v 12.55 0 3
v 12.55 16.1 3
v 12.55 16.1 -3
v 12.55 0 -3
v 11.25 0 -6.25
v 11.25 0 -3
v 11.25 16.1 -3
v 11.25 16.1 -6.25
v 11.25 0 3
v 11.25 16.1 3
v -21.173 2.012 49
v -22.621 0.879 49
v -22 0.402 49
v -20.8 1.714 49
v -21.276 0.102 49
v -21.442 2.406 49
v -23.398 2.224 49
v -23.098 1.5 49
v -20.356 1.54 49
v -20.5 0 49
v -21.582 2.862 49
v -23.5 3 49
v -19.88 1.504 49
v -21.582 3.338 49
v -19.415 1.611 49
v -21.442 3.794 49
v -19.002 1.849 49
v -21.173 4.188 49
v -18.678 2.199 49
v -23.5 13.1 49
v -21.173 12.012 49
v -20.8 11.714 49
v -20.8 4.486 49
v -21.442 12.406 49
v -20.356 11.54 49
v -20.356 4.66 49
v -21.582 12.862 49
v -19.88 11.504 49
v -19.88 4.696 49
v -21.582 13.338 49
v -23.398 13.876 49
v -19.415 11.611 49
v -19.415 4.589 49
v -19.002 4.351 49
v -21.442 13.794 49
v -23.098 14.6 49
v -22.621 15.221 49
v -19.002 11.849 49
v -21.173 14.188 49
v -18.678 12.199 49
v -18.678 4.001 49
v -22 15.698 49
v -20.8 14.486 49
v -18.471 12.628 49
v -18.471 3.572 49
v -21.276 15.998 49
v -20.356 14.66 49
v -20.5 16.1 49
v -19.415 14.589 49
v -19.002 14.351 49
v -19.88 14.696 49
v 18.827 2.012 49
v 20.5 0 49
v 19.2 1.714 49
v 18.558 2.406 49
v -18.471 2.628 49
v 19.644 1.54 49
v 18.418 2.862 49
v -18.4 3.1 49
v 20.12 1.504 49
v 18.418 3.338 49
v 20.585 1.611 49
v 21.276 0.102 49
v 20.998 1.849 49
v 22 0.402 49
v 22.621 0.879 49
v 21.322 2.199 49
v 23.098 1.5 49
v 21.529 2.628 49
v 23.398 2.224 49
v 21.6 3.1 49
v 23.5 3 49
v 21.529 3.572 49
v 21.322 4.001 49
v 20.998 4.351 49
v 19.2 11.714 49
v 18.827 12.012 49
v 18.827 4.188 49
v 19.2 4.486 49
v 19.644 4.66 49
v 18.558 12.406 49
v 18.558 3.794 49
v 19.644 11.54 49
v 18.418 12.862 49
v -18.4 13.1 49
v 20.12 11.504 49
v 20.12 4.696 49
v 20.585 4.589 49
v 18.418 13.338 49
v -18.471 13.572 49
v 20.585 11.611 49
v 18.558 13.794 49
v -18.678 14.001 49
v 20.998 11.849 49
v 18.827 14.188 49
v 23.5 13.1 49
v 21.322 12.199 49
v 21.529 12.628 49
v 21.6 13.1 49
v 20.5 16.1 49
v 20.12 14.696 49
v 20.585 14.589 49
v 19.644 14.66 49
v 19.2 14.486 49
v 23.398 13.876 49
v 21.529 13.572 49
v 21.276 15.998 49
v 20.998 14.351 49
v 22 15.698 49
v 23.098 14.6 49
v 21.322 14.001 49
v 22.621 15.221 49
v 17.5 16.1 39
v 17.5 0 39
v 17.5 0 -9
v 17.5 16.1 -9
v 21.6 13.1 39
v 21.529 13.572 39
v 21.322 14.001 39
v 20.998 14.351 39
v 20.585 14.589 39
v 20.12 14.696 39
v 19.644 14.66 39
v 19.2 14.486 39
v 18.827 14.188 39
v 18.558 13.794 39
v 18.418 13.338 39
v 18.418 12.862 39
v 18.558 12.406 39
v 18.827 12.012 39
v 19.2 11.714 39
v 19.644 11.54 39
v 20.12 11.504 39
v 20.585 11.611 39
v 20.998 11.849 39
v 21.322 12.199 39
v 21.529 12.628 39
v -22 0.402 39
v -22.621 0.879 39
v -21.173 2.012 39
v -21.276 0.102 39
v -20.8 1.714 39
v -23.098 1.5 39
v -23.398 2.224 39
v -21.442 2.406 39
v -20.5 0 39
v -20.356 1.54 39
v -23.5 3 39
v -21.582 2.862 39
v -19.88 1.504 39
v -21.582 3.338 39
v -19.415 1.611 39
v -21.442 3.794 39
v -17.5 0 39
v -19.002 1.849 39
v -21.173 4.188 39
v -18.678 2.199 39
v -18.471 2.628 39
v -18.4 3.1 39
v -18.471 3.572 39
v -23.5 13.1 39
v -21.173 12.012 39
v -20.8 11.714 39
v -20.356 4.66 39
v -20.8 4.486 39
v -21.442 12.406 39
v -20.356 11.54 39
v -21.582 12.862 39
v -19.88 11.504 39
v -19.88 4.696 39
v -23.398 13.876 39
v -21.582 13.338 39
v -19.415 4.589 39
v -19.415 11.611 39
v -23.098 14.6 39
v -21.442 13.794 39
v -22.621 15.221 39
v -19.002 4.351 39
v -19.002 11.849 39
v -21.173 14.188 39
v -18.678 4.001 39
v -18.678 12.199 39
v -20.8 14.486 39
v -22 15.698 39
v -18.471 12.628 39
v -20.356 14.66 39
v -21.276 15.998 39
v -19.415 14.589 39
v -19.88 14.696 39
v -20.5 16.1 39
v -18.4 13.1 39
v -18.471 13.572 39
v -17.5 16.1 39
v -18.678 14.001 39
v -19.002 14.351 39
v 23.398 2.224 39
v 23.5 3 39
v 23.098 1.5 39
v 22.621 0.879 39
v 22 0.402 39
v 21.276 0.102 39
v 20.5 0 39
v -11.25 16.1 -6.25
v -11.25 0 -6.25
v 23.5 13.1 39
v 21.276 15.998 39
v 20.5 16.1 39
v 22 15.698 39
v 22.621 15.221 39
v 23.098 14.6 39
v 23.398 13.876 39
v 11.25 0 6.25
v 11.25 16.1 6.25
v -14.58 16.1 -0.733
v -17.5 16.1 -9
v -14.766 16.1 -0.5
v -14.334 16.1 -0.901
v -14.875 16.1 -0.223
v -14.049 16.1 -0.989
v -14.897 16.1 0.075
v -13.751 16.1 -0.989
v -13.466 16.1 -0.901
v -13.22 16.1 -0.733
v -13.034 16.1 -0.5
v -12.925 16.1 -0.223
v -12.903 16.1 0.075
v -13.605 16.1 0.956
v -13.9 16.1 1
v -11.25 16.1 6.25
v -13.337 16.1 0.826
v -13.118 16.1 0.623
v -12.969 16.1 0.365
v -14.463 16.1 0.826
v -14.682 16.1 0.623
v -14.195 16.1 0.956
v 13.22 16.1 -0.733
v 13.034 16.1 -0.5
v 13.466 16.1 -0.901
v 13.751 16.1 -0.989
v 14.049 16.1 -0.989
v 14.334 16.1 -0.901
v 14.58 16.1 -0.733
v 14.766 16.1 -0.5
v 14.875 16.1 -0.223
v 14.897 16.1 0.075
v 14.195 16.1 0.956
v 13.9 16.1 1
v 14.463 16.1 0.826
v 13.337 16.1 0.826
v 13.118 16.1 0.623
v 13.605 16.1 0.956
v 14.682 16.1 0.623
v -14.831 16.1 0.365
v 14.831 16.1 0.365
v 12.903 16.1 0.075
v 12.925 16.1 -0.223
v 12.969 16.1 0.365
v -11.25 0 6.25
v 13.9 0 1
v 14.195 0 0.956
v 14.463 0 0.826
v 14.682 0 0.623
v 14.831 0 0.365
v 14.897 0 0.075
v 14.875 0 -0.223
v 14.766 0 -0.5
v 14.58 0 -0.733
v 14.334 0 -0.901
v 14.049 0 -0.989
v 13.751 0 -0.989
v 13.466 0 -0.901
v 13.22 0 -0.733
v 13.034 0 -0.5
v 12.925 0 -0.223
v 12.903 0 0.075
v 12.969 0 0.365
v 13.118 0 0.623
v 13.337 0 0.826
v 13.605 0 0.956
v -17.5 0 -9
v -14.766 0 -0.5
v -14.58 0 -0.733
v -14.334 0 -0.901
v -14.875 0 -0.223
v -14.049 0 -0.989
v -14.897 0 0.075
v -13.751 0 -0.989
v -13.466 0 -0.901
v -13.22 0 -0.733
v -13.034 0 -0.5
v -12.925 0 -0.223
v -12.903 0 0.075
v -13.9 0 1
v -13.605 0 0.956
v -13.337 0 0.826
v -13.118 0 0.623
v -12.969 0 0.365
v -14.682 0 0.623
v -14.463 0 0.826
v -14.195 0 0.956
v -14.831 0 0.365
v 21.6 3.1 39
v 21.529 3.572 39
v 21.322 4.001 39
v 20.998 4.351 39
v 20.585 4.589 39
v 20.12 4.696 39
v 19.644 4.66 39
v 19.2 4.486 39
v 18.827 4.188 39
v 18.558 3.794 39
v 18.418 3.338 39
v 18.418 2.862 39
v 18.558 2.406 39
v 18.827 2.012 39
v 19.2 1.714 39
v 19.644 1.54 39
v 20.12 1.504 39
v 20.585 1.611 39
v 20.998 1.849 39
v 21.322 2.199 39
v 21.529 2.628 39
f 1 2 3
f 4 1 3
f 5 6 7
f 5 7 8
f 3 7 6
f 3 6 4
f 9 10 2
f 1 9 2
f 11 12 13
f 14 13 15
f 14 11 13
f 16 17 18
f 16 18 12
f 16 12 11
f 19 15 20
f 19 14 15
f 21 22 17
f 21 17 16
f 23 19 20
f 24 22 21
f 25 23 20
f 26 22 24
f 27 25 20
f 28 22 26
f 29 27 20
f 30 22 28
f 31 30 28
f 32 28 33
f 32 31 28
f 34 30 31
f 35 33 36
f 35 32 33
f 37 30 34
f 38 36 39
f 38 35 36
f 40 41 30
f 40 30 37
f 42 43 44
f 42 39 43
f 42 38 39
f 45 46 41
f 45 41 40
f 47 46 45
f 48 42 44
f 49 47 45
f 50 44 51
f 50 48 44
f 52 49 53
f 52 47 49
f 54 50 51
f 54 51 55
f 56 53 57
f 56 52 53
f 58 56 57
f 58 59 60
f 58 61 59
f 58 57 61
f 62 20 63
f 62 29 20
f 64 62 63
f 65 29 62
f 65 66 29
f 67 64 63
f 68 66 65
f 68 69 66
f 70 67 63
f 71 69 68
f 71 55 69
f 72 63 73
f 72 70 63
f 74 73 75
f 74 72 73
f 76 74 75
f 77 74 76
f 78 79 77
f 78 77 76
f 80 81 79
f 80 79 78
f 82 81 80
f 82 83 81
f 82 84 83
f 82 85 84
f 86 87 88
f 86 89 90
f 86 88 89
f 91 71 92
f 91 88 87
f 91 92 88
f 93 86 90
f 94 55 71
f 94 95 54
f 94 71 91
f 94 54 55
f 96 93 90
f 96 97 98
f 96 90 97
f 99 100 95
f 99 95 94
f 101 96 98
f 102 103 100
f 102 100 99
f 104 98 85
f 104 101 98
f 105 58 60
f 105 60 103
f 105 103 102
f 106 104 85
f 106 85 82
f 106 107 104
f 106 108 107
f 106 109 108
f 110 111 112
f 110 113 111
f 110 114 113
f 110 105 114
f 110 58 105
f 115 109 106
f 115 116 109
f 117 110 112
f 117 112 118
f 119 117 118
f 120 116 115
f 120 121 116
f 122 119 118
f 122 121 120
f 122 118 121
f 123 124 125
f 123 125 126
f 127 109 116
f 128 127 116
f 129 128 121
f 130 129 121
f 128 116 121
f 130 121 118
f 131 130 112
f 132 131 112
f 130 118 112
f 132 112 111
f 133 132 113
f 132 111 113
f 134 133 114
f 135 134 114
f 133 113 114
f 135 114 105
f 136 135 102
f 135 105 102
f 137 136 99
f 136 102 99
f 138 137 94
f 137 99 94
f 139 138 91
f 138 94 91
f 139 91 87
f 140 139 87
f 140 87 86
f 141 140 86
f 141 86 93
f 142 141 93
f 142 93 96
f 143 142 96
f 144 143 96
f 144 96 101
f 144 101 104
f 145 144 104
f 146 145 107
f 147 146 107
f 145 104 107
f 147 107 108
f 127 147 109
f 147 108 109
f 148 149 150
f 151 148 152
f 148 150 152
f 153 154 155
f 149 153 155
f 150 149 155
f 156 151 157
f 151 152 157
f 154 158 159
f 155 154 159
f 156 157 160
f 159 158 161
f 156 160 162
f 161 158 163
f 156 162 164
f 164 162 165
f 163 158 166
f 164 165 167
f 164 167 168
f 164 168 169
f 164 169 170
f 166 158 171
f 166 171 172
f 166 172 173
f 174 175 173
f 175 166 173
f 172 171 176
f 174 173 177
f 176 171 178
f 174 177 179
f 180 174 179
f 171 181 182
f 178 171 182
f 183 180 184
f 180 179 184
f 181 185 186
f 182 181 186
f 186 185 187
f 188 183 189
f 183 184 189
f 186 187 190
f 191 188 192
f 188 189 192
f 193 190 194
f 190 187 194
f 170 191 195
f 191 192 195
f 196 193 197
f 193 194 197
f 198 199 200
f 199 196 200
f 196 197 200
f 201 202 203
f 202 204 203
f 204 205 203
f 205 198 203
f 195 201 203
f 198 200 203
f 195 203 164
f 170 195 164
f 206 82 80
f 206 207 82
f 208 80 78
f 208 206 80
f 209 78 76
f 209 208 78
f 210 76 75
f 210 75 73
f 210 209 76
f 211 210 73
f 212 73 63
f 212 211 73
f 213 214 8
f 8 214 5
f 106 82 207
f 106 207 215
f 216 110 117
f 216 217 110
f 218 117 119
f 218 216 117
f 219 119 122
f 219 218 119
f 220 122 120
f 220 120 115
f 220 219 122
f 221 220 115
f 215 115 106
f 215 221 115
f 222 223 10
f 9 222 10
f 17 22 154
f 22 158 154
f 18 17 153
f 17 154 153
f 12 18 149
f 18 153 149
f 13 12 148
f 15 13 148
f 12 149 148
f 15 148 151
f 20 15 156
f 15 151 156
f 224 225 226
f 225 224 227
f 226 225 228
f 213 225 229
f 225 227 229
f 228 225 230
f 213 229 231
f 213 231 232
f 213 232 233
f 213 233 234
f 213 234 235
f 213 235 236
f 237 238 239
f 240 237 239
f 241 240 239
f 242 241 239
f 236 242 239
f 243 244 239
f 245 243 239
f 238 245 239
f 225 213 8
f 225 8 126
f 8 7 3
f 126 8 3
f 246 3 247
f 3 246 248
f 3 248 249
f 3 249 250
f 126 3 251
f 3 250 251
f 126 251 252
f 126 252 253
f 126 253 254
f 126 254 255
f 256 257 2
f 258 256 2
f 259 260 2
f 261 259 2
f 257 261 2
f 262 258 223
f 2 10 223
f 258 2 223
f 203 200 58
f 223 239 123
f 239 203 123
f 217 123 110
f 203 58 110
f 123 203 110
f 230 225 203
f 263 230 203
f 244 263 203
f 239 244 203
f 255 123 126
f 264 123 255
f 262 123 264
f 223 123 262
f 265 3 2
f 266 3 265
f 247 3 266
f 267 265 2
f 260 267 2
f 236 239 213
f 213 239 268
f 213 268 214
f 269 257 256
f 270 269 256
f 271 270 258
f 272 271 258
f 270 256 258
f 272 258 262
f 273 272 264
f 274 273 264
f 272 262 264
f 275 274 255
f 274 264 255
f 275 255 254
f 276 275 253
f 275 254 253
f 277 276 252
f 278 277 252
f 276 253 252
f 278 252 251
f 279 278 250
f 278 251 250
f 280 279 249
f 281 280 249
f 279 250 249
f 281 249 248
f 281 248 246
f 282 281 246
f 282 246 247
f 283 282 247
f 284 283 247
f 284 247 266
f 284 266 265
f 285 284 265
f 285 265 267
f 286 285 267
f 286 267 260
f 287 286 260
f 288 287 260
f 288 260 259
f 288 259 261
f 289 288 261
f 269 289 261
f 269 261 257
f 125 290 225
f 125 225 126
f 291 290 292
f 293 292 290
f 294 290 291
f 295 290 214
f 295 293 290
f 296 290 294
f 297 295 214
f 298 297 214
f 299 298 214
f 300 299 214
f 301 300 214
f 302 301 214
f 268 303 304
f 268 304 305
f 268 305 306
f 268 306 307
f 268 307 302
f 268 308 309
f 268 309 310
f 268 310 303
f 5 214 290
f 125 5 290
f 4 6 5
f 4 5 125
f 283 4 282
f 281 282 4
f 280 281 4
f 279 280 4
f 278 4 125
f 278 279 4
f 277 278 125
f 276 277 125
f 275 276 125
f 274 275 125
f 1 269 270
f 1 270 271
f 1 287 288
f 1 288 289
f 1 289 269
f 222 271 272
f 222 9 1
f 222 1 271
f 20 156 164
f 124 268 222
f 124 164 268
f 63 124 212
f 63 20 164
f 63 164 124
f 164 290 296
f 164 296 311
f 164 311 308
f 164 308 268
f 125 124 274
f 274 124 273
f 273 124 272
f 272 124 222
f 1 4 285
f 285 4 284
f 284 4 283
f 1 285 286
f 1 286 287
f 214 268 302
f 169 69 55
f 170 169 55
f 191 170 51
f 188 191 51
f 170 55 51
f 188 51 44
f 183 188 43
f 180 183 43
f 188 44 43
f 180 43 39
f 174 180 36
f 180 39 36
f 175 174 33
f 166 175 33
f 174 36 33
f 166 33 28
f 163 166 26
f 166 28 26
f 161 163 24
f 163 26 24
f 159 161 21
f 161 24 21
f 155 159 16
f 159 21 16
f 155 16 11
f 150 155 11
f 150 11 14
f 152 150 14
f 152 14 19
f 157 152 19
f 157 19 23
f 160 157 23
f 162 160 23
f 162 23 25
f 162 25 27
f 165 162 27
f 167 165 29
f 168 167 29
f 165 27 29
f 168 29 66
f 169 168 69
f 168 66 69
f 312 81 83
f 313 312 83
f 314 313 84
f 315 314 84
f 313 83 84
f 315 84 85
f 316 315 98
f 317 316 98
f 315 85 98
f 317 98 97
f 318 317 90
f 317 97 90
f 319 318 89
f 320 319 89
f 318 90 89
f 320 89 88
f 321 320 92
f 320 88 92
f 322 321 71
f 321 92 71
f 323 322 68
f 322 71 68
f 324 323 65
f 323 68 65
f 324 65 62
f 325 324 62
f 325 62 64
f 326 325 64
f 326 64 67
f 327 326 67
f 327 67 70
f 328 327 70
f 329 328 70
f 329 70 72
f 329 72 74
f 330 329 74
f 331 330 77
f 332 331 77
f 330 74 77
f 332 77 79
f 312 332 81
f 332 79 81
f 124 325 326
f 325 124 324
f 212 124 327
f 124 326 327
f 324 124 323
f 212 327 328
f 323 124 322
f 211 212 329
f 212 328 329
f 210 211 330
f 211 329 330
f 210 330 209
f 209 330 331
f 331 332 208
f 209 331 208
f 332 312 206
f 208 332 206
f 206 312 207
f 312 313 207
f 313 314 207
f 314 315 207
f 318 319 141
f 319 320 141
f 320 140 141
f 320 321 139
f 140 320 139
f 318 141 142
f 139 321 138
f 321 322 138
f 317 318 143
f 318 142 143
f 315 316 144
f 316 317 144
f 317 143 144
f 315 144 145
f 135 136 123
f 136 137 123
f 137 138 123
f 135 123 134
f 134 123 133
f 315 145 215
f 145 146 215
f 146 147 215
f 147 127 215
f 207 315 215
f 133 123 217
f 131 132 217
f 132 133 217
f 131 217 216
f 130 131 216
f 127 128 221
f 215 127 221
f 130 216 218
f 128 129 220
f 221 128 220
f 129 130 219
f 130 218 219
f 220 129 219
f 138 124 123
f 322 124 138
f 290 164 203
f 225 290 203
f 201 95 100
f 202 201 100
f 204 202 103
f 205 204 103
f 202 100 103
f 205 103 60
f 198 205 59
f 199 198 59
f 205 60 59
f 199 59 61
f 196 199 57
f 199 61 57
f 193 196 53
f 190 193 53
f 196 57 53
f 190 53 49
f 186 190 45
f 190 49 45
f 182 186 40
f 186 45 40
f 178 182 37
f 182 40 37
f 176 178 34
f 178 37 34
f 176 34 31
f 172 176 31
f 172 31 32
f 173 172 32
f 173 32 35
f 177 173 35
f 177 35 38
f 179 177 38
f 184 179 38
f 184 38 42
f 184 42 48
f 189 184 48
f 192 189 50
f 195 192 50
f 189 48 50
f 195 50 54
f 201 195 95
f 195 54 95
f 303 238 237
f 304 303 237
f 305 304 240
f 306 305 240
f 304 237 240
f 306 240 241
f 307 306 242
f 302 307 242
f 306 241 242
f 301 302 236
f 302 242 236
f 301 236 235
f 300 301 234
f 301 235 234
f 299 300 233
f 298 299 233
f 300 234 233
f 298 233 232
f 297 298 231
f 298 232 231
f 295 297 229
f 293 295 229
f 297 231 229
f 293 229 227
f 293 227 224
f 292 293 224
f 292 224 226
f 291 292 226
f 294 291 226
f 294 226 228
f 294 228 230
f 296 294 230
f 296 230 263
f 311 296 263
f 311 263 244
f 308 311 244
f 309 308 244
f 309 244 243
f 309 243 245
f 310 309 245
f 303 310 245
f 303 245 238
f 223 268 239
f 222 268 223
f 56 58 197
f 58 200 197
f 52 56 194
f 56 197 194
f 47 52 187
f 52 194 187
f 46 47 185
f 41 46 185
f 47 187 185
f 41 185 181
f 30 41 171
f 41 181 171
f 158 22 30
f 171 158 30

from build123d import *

# Parameters (mm, degrees)
SKETCH_2_W          = 35
SKETCH_2_H          = 18
SKETCH_2_W_2        = 22.5
SKETCH_2_H_2        = 12.5
EXTRUDE_1_DEPTH     = 16.1
SKETCH_3_R          = 1
CUT_EXTRUDE_1_DEPTH = 26.425577673
SKETCH_8_W          = 1.3
SKETCH_8_H          = 6
CUT_EXTRUDE_2_DEPTH = 26.425577673
SKETCH_9_W          = 6
SKETCH_9_H          = 16.1
SKETCH_9_R          = 1.6
EXTRUDE_4_DEPTH     = 10
EXTRUDE_4_2_DEPTH   = 10
SKETCH_10_W         = 35
SKETCH_10_H         = 16.1
EXTRUDE_5_DEPTH     = 40
FILLET_1_R          = 3


with BuildPart() as part:
    # 草图2 → 凸台-拉伸1 (new body)
    with BuildSketch(Plane(origin=(0, 0, 0), x_dir=(1, 0, 0), z_dir=(0, 1, 0))):
        Rectangle(SKETCH_2_W, SKETCH_2_H)
        Rectangle(SKETCH_2_W_2, SKETCH_2_H_2, mode=Mode.SUBTRACT)
    extrude(amount=EXTRUDE_1_DEPTH)

    # 草图3 → 切除-拉伸1 (cut, through all)
    with BuildSketch(Plane(origin=(0, 16.1, 0), x_dir=(1, 0, 0), z_dir=(0, 1, 0))):
        with Locations(Location((-13.9, 0, 0), (0, 0, 270))):
            Circle(SKETCH_3_R)
        with Locations(Location((13.9, 0, 0), (0, 0, 270))):
            Circle(SKETCH_3_R)
    extrude(amount=-CUT_EXTRUDE_1_DEPTH, mode=Mode.SUBTRACT)

    # 草图8 → 切除-拉伸2 (cut, through all)
    with BuildSketch(Plane(origin=(0, 16.1, 0), x_dir=(1, 0, 0), z_dir=(0, 1, 0))):
        with Locations((11.9, 0)):
            Rectangle(SKETCH_8_W, SKETCH_8_H)
    extrude(amount=-CUT_EXTRUDE_2_DEPTH, mode=Mode.SUBTRACT)



with BuildPart() as body_2:
    # 草图9 → 凸台-拉伸4 (new body)
    with BuildSketch(Plane.XY.offset(49)):
        with Locations((20.5, 8.05)):
            Rectangle(SKETCH_9_W, SKETCH_9_H)
        with Locations((20, 3.1)):
            Circle(SKETCH_9_R, mode=Mode.SUBTRACT)
        with Locations((20, 13.1)):
            Circle(SKETCH_9_R, mode=Mode.SUBTRACT)
    extrude(amount=-EXTRUDE_4_DEPTH)


with BuildPart() as body_3:
    # 草图9 → Extrude 4 2 (new body)
    with BuildSketch(Plane.XY.offset(49)):
        with Locations((-20.5, 8.05)):
            Rectangle(SKETCH_9_W, SKETCH_9_H)
        with Locations((-20, 3.1)):
            Circle(SKETCH_9_R, mode=Mode.SUBTRACT)
        with Locations((-20, 13.1)):
            Circle(SKETCH_9_R, mode=Mode.SUBTRACT)
    extrude(amount=-EXTRUDE_4_2_DEPTH)


with BuildPart() as part_1:
    add(part.part)

    add(body_2.part)  # 凸台-拉伸5 merges body 2

    add(body_3.part)  # 凸台-拉伸5 merges body 3
    # 草图10 → 凸台-拉伸5 (add)
    with BuildSketch(Plane.XY.offset(49)):
        with Locations((0, 8.05)):
            Rectangle(SKETCH_10_W, SKETCH_10_H)
    extrude(amount=-EXTRUDE_5_DEPTH)

    # 圆角1
    fillet_1_edges = [part_1.edges().sort_by_distance(p)[0] for p in [
        (23.5, 16.1, 44),
        (23.5, 0, 44),
        (-23.5, 16.1, 44),
        (-23.5, 0, 44),
    ]]
    fillet(fillet_1_edges, radius=FILLET_1_R)


solid = part_1.part
